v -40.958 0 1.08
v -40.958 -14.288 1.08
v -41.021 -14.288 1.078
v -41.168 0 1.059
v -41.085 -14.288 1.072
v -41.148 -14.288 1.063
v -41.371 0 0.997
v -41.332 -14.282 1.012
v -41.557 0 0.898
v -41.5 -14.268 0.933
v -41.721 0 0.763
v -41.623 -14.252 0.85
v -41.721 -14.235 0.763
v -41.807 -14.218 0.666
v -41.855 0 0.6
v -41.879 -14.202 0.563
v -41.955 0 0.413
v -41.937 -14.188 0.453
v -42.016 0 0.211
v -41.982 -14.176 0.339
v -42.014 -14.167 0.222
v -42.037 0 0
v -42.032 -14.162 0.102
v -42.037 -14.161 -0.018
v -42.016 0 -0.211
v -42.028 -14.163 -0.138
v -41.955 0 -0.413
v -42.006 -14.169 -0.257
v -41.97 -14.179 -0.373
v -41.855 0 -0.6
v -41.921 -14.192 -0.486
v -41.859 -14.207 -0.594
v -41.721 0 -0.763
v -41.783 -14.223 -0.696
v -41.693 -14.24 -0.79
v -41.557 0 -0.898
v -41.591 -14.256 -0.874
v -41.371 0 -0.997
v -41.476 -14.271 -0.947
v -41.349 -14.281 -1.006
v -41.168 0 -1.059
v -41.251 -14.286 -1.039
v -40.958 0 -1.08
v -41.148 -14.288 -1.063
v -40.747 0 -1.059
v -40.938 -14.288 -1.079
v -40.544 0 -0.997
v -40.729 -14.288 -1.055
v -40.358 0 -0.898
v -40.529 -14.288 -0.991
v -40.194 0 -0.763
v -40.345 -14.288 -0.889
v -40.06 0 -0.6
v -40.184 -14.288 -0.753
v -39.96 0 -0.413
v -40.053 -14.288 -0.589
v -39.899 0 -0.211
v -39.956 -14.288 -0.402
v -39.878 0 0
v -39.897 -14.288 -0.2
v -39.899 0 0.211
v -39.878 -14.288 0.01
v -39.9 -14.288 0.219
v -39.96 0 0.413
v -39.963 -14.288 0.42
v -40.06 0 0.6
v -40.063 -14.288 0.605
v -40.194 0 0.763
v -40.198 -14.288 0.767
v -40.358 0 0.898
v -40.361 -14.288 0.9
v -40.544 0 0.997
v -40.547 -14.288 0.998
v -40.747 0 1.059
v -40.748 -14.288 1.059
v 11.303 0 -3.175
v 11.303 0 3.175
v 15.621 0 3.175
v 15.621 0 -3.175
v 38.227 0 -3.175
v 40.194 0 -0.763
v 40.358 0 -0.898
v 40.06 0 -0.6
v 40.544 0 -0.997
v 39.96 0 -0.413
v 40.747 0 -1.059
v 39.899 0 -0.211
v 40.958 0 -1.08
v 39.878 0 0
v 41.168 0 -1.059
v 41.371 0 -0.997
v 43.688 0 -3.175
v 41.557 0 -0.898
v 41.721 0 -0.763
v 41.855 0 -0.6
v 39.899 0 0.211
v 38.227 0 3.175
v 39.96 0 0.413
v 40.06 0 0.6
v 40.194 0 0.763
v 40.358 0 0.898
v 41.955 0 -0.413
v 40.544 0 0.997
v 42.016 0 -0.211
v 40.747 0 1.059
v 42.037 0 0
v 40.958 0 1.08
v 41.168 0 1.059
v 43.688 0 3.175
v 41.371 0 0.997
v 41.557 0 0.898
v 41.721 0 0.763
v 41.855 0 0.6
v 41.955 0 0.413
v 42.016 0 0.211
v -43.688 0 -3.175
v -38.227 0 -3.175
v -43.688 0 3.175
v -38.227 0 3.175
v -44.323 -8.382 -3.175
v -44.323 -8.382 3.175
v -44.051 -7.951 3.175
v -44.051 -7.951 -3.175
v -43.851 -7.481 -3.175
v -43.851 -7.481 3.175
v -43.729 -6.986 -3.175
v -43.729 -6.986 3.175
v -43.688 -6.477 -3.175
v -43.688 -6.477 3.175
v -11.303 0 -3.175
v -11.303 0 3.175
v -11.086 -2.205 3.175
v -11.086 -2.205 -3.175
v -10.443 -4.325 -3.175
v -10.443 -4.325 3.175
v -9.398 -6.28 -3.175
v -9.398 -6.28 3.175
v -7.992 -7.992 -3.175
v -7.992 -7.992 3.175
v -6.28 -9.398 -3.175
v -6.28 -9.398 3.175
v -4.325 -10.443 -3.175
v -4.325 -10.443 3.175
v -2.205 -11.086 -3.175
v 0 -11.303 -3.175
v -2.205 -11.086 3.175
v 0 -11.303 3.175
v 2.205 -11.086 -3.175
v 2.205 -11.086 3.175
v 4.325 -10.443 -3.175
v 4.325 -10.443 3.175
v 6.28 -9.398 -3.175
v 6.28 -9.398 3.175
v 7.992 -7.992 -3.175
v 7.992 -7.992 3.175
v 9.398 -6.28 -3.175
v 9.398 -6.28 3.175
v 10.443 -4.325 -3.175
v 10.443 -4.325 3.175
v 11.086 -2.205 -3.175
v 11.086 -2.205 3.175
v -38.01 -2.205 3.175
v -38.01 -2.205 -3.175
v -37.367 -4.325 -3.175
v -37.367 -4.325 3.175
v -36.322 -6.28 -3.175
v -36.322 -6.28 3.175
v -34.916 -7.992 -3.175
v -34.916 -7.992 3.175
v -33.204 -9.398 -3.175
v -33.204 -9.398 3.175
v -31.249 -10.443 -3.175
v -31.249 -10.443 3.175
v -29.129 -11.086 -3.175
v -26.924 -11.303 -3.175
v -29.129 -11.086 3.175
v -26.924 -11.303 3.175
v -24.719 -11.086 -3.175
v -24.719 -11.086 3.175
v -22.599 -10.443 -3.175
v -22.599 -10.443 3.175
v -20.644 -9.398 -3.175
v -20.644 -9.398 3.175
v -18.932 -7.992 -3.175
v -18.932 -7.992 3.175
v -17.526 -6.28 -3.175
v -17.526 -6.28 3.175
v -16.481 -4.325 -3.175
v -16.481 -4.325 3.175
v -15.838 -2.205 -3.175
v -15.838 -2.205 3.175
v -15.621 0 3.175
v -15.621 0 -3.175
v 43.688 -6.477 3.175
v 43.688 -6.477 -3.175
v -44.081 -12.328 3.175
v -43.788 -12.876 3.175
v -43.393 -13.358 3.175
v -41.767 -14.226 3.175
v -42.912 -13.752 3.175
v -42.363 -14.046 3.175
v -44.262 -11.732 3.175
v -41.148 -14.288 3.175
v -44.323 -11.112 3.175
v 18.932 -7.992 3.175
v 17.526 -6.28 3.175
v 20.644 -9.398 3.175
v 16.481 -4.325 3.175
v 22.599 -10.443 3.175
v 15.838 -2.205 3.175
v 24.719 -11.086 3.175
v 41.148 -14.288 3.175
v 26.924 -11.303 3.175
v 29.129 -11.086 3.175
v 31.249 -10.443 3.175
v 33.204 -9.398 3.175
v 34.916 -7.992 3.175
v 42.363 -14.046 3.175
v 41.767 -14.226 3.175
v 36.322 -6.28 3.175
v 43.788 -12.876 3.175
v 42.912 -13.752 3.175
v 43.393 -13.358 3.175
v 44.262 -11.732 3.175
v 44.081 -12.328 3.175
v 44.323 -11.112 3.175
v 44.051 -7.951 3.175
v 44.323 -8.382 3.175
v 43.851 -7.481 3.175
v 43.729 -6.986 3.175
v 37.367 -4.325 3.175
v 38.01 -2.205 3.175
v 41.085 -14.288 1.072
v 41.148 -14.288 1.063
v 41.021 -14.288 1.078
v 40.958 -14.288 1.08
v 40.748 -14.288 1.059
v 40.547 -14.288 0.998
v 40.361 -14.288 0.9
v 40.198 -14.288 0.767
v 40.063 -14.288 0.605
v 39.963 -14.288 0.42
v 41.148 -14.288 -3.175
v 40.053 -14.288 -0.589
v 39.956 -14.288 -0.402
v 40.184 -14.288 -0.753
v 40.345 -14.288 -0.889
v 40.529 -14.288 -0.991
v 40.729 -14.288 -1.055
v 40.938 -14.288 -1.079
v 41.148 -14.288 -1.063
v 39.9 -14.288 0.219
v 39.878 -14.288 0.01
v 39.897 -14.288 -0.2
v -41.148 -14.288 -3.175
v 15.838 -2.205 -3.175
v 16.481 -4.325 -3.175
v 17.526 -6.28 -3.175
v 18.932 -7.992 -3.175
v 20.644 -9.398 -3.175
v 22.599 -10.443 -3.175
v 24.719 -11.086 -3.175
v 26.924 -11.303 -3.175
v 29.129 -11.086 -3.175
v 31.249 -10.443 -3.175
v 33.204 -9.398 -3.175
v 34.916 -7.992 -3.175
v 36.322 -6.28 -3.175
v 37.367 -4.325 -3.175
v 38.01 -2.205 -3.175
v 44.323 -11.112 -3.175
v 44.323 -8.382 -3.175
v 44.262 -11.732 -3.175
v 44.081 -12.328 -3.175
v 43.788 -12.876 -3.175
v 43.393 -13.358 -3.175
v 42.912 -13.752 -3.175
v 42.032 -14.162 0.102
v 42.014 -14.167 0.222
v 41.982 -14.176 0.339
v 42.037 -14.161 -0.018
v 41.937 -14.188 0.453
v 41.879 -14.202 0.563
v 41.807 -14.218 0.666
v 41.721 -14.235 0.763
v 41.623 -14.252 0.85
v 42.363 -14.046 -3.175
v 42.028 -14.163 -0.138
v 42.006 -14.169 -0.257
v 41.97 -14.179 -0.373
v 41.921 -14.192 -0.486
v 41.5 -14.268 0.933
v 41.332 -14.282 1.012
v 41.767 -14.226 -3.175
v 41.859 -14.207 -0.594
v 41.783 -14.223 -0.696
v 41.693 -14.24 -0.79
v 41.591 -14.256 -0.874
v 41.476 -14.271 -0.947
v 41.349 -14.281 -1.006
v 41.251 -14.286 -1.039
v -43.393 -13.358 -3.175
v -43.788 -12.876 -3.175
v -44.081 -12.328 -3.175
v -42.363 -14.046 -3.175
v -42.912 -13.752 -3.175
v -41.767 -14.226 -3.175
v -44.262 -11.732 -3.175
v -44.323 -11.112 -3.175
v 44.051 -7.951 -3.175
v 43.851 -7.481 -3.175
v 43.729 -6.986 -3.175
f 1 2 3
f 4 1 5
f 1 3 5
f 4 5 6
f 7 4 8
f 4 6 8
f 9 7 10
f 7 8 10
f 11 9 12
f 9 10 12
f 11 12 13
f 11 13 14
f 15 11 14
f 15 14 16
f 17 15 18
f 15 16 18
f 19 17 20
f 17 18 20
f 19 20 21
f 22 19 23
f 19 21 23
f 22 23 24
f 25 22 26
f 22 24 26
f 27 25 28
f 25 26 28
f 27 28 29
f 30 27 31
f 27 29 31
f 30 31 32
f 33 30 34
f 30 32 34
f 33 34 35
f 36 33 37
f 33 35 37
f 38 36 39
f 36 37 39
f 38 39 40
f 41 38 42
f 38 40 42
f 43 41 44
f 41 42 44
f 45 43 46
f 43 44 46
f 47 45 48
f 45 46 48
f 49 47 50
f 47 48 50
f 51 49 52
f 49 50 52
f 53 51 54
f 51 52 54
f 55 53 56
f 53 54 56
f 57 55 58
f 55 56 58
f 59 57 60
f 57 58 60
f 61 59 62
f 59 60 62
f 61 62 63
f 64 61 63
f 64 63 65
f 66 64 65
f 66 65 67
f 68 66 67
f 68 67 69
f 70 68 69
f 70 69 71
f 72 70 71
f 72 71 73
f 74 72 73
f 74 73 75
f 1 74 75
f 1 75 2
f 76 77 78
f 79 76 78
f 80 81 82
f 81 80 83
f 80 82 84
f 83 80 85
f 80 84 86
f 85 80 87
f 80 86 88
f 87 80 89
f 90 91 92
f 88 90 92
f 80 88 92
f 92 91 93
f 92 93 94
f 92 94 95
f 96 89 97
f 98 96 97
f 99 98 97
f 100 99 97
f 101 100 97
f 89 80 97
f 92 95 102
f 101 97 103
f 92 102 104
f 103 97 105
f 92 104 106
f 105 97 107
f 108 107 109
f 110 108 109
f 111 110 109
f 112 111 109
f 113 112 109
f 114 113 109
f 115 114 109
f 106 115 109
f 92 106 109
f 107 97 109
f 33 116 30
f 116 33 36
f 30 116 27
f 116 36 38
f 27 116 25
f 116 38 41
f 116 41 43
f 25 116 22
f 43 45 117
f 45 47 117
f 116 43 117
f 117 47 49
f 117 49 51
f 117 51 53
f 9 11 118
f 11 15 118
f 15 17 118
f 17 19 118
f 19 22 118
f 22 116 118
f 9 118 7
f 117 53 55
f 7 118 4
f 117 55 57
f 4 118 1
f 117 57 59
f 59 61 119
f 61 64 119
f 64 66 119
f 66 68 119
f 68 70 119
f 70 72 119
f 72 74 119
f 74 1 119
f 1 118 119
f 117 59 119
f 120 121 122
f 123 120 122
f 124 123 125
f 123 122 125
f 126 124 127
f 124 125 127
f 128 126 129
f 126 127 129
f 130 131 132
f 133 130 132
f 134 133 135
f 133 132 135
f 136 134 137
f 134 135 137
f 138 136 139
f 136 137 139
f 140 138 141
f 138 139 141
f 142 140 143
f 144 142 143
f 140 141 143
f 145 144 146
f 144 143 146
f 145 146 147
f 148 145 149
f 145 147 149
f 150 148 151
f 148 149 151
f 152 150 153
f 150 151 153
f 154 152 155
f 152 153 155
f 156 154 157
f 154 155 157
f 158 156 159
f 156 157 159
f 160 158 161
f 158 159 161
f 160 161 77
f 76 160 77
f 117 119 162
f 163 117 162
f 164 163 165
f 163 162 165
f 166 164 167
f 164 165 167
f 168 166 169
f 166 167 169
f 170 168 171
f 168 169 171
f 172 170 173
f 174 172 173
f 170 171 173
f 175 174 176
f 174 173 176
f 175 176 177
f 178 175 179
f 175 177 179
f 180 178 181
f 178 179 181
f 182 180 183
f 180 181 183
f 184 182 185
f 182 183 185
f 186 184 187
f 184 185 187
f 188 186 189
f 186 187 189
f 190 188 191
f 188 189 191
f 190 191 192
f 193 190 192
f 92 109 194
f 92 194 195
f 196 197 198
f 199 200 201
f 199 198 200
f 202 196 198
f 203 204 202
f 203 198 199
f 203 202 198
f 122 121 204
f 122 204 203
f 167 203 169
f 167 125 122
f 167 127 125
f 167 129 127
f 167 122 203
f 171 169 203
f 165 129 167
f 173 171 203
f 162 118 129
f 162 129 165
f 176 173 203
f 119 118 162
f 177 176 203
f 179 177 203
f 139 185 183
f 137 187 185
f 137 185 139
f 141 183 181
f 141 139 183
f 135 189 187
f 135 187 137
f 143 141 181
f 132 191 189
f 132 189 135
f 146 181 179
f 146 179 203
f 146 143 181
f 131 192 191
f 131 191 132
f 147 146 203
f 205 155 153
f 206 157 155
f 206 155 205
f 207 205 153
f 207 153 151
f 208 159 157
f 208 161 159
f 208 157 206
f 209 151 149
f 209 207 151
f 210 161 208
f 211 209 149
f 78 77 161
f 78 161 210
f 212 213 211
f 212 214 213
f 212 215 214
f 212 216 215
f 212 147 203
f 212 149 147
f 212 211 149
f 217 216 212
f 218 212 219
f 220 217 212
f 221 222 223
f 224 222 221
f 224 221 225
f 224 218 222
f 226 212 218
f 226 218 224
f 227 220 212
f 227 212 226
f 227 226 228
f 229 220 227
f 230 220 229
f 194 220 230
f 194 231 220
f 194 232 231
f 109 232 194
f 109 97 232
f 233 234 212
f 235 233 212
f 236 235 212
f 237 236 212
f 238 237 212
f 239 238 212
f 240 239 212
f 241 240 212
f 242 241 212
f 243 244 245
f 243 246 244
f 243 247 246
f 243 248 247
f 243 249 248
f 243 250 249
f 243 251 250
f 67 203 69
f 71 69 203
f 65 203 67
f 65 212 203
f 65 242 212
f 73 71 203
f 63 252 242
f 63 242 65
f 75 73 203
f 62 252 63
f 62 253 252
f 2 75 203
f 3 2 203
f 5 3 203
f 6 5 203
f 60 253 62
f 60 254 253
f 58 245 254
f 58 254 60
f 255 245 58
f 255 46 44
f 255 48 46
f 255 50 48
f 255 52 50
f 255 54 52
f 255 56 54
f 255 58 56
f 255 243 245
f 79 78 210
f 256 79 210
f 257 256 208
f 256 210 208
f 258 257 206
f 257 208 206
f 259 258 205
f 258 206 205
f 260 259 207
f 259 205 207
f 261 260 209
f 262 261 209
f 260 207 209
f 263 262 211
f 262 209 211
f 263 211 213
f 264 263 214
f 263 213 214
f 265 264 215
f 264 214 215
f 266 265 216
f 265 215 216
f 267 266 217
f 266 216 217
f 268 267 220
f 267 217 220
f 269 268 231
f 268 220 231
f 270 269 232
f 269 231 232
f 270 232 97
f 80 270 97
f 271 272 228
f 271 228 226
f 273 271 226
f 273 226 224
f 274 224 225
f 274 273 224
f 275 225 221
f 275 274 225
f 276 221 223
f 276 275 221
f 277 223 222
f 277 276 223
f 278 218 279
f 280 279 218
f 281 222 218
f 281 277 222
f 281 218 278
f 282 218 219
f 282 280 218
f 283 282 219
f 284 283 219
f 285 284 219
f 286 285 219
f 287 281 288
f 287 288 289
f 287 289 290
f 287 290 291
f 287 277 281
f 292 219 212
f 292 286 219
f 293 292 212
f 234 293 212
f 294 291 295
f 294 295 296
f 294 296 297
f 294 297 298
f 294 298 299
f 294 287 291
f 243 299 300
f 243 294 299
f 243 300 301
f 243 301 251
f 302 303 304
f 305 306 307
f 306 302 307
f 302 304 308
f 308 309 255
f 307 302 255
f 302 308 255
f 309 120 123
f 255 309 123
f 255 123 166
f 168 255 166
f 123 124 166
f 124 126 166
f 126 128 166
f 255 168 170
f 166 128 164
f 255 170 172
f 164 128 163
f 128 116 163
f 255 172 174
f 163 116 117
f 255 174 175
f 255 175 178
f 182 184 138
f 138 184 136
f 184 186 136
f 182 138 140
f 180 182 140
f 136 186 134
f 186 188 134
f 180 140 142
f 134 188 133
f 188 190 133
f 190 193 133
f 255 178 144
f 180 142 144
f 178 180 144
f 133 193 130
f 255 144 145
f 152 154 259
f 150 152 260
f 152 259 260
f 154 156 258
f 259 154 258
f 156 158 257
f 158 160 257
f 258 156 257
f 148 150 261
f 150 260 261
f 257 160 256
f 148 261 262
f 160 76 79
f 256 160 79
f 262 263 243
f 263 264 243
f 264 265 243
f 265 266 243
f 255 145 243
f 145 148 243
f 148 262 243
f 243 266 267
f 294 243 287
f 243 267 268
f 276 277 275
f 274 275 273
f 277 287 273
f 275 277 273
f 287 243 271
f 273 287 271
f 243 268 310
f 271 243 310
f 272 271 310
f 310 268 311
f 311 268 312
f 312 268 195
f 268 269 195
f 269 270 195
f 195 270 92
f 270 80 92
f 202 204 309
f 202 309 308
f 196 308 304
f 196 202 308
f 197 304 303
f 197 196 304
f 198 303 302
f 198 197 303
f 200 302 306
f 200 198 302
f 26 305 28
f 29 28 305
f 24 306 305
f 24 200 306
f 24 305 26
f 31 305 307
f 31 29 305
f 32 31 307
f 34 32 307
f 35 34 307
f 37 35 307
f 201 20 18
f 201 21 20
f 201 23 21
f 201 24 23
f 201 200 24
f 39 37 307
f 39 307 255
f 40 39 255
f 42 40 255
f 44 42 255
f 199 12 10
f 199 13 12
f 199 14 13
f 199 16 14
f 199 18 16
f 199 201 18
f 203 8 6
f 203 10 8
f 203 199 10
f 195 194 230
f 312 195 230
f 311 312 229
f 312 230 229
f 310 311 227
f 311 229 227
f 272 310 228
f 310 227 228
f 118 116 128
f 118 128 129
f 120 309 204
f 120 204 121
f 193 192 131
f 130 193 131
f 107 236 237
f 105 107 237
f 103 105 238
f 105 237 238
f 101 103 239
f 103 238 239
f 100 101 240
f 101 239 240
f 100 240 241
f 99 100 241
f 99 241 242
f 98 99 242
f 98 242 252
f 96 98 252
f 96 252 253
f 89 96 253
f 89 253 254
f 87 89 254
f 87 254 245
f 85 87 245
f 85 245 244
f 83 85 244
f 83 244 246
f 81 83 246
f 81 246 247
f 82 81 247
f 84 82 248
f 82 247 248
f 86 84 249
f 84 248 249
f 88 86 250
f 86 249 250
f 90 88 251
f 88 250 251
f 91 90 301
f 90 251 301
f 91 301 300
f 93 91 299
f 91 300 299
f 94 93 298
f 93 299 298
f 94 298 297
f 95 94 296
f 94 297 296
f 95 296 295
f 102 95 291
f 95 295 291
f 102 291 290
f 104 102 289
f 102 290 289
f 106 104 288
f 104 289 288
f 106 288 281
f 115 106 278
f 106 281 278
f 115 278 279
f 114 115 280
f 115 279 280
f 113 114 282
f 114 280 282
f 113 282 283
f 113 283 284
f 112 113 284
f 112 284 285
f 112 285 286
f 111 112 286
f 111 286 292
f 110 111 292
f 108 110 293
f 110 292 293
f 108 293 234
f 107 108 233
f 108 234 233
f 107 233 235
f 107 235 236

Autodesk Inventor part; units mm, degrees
ref_plane "YZ Plane" through (0, 0, 0) normal (1, 0, 0) x (0, 1, 0)
ref_plane "XZ Plane" through (0, 0, 0) normal (0, 1, 0) x (-1, 0, 0)
ref_plane "XY Plane" through (0, 0, 0) normal (0, 0, 1) x (1, 0, 0)
sketch "Sketch1" plane through (0, 0, 0) normal (0, 0, 1) x (1, 0, 0)
  line L0 (-44.323, 14.2875) -> (44.323, 14.2875)
  line L1 (44.323, 14.2875) -> (44.323, -14.2875)
  line L2 (44.323, -14.2875) -> (-44.323, -14.2875)
  line L3 (-44.323, -14.2875) -> (-44.323, 14.2875)
  point P0 (0, 0)
  dimension "d0" = 88.646
  dimension "d1" = 44.323
  dimension "d2" = 14.2875
  dimension "d3" = 28.575
extrude "Extrusion1" add sketch "Sketch1" along normal mid plane 6.35
sketch "Sketch2" plane through (0, 0, 3.175) normal (0, 0, 1) x (1, 0, 0)
  circle A0 centre (-26.924, 0) radius 11.303
  circle A1 centre (0, 0) radius 11.303
  line L0 (44.323, -14.2875) -> (44.323, 14.2875) projected
  circle A2 centre (26.924, 0) radius 11.303
  line L1 (-44.323, 14.2875) -> (-44.323, -14.2875) projected
  line L2 (-44.323, 0) -> (44.323, 0) construction
  line L3 (44.323, 14.2875) -> (-44.323, 14.2875) projected
  point P0 (0, 0)
  dimension "d6" = 22.606
  dimension "d9" = 22.606
  dimension "d11" = 22.606
  dimension "d14" = 26.924
  dimension "d21" = 88.646
  dimension "d22" = 26.924
  dimension "d50" = 0
sketch "Sketch4" plane through (-44.323, -14.2875, -3.175) normal (-1, 0, 0) x (0, 0, 1)
  line L0 (0, 0) -> (0, 28.575) projected
  line L1 (6.35, 28.575) -> (6.35, 0) projected
  line L2 (0, 22.6695) -> (6.35, 22.6695)
  line L3 (6.35, 22.6695) -> (6.35, 5.9055)
  line L4 (6.35, 5.9055) -> (0, 5.9055)
  line L5 (0, 5.9055) -> (0, 22.6695)
  point P0 (3.175, 14.2875)
  dimension "d30" = 8.382
  dimension "d31" = 16.764
extrude "Extrusion3" cut sketch "Sketch4" against normal blind 0.635
mirror "Mirror1" about plane through (0, 0, 0) normal (1, 0, 0) of "Extrusion3"
sketch "Sketch7" plane through (-44.323, -14.2875, 3.175) normal (0, -1, 0) x (1, 0, 0)
  line L0 (30.353, -14.605) -> (58.293, -14.605)
  line L1 (58.293, -14.605) -> (58.293, 8.255)
  line L2 (58.293, 8.255) -> (30.353, 8.255)
  line L3 (30.353, 8.255) -> (30.353, -14.605)
  point P0 (44.323, -3.175)
  dimension "d39" = 27.94
  dimension "d40" = 22.86
  dimension "d41" = 11.43
  dimension "d42" = 13.97
extrude "Extrusion5" [suppressed]
sketch "Sketch8" plane through (0, 0, -3.175) normal (0, 0, -1) x (-1, 0, 0)
  line L0 (-44.323, 14.2875) -> (44.323, 14.2875) projected
  line L1 (15.6718, 14.2875) -> (-15.6718, 14.2875)
  line L2 (-15.6718, 14.2875) -> (-15.6718, 52.3875)
  line L3 (-15.6718, 52.3875) -> (15.6718, 52.3875)
  line L4 (15.6718, 52.3875) -> (15.6718, 14.2875)
  point P0 (0, 0)
  dimension "d45" = 31.3436
  dimension "d46" = 38.1
  dimension "d47" = 15.6718
extrude "Extrusion6" add sketch "Sketch8" against normal up to surface (6.35 mm away)
extrude "Extrusion7" cut sketch "Sketch2" against normal blind 25.4
sketch "Sketch9" plane through (-15.6718, 52.3875, -3.175) normal (0, 1, 0) x (1, 0, 0)
  line L0 (-28.6512, -6.35) -> (59.9948, -6.35) projected
  line L1 (3.1718, -6.35) -> (28.1718, -6.35)
  line L2 (28.1718, -6.35) -> (28.1718, -3.175)
  line L3 (28.1718, -3.175) -> (3.1718, -3.175)
  line L4 (3.1718, -3.175) -> (3.1718, -6.35)
  point P0 (15.6718, -3.175)
  dimension "d64" = 3.175
  dimension "d65" = 25
  dimension "d66" = 12.5
extrude "Extrusion8" cut sketch "Sketch9" against normal blind 0.9
sketch "Sketch13" plane through (0, 0, 3.175) normal (0, 0, 1) x (1, 0, 0)
  line L0 (-15.6718, 52.3875) -> (-12.5, 52.3875) projected
  line L1 (-12.5, 52.3875) -> (12.5, 52.3875) projected
  line L2 (12.5, 52.3875) -> (15.6718, 52.3875) projected
  line L3 (15.6718, 52.3875) -> (15.6718, 14.2875) projected
  line L4 (-15.6718, 14.2875) -> (-15.6718, 52.3875) projected
  line L5 (-15.6718, 14.2875) -> (-44.323, 14.2875) projected
  line L6 (44.323, 14.2875) -> (15.6718, 14.2875) projected
  line L7 (44.323, 8.382) -> (44.323, 14.2875) projected
  line L8 (-44.323, 14.2875) -> (-44.323, 8.382) projected
  line L9 (-44.323, 8.382) -> (-43.688, 8.382) projected
  line L10 (43.688, 8.382) -> (44.323, 8.382) projected
  line L11 (-43.688, 8.382) -> (-43.688, 0)
  line L12 (-43.688, 8.382) -> (-43.688, -8.382) projected
  line L13 (-43.688, 0) -> (43.688, 0)
  line L14 (43.688, 8.382) -> (43.688, -8.382) projected
  line L15 (43.688, 0) -> (43.688, 8.382)
  point P0 (0, 0)
extrude "Extrusion11" cut sketch "Sketch13" against normal through all
fillet "Fillet3" radius 3.175 2 edges at (-43.688, -8.382, 0) (43.688, -8.382, 0)
fillet "Fillet1" radius 3.175 2 edges at (44.323, -14.2875, 0) (-44.323, -14.2875, 0)
sketch "Sketch14" plane through (-43.688, 0, 3.175) normal (0, 1, 0) x (1, 0, 0)
  line L0 (5.461, 6.35) -> (5.461, 0) projected
  line L1 (0, 6.35) -> (5.461, 6.35) projected
  line L2 (0, 0) -> (0, 6.35) projected
  line L3 (5.461, 0) -> (0, 0) projected
  circle A0 centre (2.7305, 3.175) radius 1.5494
  point P0 (43.688, 3.175)
  dimension "d84" = 3.0988
  dimension "d85" = 5.461
  dimension "d87" = 3.175
  dimension "d88" = 2.7305
  dimension "d98" = 6.35
hole "Hole1" at (-40.9575, 0, 0) direction (0, -1, 0) diameter 2.159 end through all
mirror "Mirror4" about plane through (0, 0, 0) normal (1, 0, 0) of "Hole1"
equation "\"d1\" = 0.5 * d0"
equation "\"d2\" = 0.5 * d3"
equation "\"d9\" = d7"
equation "\"d11\" = d9"
equation "\"d22\" = d14"
equation "\"d30\" = 0.5 * d31"
equation "\"d41\" = 0.5 * d40"
equation "\"d42\" = 0.5 * d39"
equation "\"d47\" = 0.5 * d45"
equation "\"d66\" = 0.5 * d65"
equation "\"d87\" = 0.5 * d98"
equation "\"d88\" = 0.5 * d85"
equation "\"d7\" = d6"
properties part number "Tube Holder Halve 3" material "Aluminum 6061-AHC"
